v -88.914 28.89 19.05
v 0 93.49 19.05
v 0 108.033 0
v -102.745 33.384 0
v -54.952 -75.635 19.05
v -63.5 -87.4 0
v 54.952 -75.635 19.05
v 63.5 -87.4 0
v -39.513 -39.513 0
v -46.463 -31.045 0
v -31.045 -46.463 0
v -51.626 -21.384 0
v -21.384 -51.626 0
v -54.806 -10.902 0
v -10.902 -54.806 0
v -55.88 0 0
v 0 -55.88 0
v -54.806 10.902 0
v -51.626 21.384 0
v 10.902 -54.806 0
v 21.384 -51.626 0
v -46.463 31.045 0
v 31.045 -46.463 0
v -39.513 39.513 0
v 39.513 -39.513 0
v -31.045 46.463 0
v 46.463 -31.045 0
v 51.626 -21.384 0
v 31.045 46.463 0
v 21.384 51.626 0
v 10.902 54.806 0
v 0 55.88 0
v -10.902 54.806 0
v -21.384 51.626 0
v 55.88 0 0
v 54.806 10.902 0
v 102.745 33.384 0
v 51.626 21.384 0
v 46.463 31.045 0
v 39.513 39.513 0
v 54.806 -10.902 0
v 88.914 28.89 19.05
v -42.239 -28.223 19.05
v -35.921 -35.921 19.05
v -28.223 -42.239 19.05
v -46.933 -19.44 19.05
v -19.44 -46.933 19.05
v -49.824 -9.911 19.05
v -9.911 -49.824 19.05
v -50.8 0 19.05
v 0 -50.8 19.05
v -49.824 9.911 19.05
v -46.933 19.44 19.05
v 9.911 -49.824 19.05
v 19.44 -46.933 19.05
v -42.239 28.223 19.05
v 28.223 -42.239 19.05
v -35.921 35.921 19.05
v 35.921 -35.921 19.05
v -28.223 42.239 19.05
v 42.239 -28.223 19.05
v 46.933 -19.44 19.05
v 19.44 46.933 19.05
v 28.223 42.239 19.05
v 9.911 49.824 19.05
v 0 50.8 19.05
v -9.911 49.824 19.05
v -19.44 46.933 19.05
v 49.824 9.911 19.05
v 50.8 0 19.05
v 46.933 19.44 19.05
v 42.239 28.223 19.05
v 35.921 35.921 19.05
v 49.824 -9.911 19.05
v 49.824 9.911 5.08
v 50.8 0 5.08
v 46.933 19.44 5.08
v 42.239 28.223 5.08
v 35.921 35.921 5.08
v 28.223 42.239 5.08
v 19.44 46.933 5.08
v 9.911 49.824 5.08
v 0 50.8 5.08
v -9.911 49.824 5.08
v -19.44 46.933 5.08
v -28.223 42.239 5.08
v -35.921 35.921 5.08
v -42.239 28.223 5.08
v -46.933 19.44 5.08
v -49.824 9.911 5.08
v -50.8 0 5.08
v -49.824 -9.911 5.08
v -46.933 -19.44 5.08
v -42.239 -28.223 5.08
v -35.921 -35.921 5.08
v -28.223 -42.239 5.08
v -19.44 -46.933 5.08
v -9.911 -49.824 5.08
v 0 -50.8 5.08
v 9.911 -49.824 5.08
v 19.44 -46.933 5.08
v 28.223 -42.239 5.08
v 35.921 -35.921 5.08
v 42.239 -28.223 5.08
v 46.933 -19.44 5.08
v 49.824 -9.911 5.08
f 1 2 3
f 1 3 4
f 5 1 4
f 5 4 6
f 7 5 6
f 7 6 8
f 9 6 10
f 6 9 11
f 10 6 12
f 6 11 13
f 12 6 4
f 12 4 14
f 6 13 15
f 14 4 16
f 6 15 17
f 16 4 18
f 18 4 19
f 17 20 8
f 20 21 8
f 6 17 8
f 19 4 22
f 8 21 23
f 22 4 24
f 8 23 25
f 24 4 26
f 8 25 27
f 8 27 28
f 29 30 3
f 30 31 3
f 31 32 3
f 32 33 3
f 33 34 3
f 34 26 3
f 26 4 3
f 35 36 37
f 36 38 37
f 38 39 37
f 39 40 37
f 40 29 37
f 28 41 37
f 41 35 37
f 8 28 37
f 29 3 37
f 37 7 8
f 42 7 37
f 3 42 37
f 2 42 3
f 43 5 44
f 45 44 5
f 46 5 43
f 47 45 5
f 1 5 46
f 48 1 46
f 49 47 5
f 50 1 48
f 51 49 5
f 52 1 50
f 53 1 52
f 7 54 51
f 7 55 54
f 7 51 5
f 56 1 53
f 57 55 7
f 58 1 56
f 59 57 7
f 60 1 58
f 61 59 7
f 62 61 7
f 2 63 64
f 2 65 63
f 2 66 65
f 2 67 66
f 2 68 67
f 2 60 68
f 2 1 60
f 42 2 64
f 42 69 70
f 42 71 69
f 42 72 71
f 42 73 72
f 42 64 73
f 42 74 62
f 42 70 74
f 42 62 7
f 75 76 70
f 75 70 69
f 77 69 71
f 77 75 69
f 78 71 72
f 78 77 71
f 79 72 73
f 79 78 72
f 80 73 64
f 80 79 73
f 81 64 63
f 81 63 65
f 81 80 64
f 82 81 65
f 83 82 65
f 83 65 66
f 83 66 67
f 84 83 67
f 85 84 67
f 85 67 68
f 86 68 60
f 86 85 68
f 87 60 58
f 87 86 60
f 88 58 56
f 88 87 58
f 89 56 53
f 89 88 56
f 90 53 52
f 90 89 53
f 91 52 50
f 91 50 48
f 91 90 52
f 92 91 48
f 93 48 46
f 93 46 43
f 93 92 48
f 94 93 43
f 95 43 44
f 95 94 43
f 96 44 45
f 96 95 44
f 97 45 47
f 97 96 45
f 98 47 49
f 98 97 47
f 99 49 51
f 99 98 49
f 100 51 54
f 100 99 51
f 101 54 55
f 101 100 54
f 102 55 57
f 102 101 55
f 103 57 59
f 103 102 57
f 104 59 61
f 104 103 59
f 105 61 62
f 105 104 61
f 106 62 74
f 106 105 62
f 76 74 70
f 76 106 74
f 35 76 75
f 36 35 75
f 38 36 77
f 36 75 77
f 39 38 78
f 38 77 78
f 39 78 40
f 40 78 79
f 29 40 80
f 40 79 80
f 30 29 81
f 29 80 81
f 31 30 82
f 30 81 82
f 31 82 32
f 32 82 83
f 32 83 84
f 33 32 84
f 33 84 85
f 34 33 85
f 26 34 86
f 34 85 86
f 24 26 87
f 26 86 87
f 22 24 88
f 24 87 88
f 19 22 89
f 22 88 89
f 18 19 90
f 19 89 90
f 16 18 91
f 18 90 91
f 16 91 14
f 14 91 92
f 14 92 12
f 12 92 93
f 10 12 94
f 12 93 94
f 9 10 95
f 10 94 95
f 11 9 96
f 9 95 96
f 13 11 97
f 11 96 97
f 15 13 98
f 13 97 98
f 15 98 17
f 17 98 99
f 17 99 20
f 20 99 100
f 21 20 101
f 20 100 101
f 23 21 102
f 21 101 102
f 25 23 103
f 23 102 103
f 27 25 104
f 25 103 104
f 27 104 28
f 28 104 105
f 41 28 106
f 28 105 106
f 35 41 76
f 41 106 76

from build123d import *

# Parameters (mm, degrees)
F0_R     = 50.8
F1_DEPTH = 19.05
F2_SIZE2 = 11.76551
F2_SIZE  = 19.04999
F3_SIZE  = 5.08


# Not quite as in the source:
# - a fillet or chamfer is up to 0.001 mm smaller than in the source, because OpenCascade refuses the exact size


with BuildPart() as f1:
    # F0 (on Top) → F1 (new body)
    with BuildSketch(Plane.XY):
        Polygon((0, 108.0326526607), (-102.7451582856, 33.3839256196), (-63.5, -87.4002519499), (63.5, -87.4002519499), (102.7451582856, 33.3839256196), align=None)
        Circle(F0_R, mode=Mode.SUBTRACT)
    extrude(amount=F1_DEPTH)

    # F2 (size 19.05 and 11.7655197988 in the source; OpenCascade refuses exactly that, so slightly less here)
    f2_edges = [f1.edges().sort_by_distance(p)[0] for p in [
        (0, -87.400252, 19.05),
        (83.122579, -27.008163, 19.05),
        (51.372579, 70.708289, 19.05),
        (-51.372579, 70.708289, 19.05),
        (-83.122579, -27.008163, 19.05),
    ]]
    chamfer(f2_edges, length=F2_SIZE, length2=F2_SIZE2)

    # F3
    f3_edges = [f1.edges().sort_by_distance(p)[0] for p in [
        (-50.8, 0, 0),
    ]]
    chamfer(f3_edges, length=F3_SIZE)


solid = f1.part
